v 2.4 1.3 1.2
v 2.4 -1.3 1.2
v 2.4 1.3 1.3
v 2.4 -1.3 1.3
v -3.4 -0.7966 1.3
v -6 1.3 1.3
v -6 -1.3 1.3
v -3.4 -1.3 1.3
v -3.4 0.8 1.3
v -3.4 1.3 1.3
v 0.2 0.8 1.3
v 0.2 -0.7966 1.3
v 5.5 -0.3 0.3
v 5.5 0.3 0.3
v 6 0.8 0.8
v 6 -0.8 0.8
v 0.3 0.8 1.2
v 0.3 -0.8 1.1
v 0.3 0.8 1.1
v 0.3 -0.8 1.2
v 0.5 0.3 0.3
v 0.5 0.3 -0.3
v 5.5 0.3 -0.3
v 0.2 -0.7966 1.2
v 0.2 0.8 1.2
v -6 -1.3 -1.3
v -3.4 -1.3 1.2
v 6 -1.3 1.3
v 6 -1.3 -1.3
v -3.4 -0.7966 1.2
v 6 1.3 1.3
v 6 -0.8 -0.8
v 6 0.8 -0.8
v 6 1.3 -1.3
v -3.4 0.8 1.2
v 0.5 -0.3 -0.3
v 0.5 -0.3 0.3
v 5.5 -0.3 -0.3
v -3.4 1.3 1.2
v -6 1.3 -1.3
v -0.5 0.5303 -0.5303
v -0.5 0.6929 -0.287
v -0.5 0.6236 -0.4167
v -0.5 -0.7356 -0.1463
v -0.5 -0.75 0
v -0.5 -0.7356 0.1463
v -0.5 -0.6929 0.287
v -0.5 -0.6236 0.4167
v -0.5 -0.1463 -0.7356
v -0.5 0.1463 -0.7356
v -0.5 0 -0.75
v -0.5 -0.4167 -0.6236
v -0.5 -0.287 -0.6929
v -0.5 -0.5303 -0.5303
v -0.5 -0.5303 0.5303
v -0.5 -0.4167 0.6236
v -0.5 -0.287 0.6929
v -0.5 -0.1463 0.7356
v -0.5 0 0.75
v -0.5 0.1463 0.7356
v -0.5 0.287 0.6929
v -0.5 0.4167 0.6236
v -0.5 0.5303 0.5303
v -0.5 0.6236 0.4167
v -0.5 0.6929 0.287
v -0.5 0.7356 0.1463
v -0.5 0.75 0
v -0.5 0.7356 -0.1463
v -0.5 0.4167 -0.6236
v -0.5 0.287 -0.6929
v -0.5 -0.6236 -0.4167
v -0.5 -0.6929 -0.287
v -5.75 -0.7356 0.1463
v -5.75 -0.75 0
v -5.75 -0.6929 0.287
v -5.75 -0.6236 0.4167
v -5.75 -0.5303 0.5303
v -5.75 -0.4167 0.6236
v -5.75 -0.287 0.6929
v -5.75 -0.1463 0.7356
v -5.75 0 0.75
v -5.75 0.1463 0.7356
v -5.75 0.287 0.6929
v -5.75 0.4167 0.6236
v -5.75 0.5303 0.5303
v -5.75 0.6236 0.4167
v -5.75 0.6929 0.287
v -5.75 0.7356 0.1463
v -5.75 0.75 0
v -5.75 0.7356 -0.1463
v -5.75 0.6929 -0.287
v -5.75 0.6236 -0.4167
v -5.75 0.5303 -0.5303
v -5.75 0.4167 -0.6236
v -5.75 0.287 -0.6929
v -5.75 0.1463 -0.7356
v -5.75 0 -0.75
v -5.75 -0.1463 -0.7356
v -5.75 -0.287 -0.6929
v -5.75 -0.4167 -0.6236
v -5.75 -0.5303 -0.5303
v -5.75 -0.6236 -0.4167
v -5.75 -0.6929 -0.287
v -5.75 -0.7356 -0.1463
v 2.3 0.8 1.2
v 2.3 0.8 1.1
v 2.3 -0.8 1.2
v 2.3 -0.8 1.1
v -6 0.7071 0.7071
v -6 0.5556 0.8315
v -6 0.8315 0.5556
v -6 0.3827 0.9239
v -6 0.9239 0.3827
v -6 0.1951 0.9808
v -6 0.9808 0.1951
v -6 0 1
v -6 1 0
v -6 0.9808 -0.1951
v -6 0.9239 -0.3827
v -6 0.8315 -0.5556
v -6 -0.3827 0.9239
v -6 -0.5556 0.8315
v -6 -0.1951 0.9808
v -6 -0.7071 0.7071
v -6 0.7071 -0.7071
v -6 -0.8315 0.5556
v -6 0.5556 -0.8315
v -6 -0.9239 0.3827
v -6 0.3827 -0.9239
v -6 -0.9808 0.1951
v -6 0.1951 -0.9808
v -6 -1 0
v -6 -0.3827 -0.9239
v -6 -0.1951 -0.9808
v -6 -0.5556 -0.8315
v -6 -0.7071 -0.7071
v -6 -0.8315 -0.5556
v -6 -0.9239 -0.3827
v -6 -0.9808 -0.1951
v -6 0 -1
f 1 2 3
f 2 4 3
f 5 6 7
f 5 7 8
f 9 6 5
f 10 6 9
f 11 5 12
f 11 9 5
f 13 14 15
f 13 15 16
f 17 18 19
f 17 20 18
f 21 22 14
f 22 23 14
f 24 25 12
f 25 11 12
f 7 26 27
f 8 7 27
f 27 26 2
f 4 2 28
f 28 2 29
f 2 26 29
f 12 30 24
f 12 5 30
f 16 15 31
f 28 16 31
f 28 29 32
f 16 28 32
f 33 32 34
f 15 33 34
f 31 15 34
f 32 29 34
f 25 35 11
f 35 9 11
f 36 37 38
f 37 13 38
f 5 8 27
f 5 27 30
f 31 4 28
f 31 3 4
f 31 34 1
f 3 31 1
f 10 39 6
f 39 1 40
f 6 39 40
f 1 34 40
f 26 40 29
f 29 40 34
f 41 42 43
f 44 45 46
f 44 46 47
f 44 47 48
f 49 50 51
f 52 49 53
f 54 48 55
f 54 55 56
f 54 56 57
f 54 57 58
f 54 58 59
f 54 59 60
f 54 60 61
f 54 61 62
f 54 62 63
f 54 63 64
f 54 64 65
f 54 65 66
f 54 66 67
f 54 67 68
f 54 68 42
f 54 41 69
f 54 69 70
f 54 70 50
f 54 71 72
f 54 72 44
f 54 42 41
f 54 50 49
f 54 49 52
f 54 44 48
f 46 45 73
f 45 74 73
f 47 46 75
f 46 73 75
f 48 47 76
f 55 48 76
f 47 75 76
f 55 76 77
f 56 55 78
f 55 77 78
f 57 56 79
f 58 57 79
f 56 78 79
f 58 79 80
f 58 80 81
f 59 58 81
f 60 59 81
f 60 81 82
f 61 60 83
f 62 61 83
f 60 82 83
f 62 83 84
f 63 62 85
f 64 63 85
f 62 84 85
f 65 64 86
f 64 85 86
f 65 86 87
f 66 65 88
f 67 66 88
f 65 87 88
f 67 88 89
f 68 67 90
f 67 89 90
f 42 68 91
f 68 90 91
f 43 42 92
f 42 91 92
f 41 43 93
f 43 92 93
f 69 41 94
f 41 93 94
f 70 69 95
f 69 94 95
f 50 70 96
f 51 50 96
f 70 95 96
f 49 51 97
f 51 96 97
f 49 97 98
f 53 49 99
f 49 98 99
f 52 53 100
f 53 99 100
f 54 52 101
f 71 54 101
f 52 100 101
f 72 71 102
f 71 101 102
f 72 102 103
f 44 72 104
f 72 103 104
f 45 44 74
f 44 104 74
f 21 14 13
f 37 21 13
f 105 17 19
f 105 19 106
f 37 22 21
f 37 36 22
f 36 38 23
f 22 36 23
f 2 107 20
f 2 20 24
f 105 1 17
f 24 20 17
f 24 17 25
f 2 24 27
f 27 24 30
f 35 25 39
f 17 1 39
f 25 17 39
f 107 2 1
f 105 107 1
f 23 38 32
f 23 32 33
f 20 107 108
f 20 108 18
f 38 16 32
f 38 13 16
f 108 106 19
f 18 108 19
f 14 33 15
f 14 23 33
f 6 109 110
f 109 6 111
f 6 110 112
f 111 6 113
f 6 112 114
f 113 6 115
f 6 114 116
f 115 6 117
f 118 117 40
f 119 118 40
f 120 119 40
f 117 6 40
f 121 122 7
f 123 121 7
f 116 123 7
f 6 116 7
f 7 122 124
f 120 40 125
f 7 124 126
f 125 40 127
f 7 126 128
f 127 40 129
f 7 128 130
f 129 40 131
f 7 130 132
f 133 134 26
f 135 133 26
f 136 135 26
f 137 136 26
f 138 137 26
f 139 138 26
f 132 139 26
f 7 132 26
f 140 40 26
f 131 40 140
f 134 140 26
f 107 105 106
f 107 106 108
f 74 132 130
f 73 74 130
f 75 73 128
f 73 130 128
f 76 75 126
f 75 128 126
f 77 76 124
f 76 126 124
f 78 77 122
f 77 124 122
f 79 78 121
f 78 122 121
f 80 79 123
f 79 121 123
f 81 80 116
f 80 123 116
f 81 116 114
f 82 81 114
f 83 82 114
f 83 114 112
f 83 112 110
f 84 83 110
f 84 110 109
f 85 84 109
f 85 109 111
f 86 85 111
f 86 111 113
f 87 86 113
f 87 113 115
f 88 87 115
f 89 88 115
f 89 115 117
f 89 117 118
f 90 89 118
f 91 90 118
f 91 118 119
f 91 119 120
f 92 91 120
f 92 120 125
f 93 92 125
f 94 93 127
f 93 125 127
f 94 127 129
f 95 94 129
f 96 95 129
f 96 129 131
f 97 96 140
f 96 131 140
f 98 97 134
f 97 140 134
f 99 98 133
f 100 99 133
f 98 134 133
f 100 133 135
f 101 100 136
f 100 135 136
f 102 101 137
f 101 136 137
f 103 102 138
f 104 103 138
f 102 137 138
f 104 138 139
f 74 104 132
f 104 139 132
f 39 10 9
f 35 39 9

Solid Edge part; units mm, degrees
sketch "Sketch1" plane through (0, 0, 0) normal (0, 0, 1) x (1, 0, 0)
  line L0 (-6, -1.3) -> (6, -1.3)
  line L1 (6, -1.3) -> (6, 1.3)
  line L2 (6, 1.3) -> (-6, 1.3)
  line L3 (-6, 1.3) -> (-6, -1.3)
  dimension "D1" = 2.6
  dimension "D2" = 12
extrude "Protrusion1" add sketch "Sketch1" along normal mid plane 2.6
sketch "Sketch2" plane through (6, 0, 0) normal (1, 0, 0) x (0, 1, 0)
  line L0 (-0.3, -0.3) -> (0.3, -0.3)
  line L1 (0.3, -0.3) -> (0.3, 0.3)
  line L2 (0.3, 0.3) -> (-0.3, 0.3)
  line L3 (-0.3, 0.3) -> (-0.3, -0.3)
  dimension "D1" = 0.6
  dimension "D2" = 0.6
extrude "Extrusionsausschnitt_1" cut sketch "Sketch2" against normal blind 5.5
chamfer "Fase_1" distance 0.5 angle 45 4 edges at (6, 0, 0.3) (6, 0.3, 0) (6, -0.3, 0) (6, 0, -0.3)
sketch "Sketch3" plane through (-6, 0, 0) normal (-1, 0, 0) x (0, -1, 0)
  circle A0 centre (0, 0) radius 0.75
  dimension "D1" = 1.5
extrude "Extrusionsausschnitt_2" cut sketch "Sketch3" against normal blind 5.5
sketch "Sketch4" plane through (0, 0, 1.3) normal (0, 0, 1) x (1, 0, 0)
  line L0 (0.2, -1.3) -> (-3.4, -1.3)
  line L1 (-3.4, -1.3) -> (-3.4, -0.7966)
  line L2 (-3.4, -0.7966) -> (0.2, -0.7966)
  line L3 (0.2, 0.8) -> (0.2, -0.7966)
  line L4 (-3.4, 0.8) -> (0.2, 0.8)
  line L5 (-3.4, 1.3) -> (-3.4, 0.8)
  line L6 (0.2, 1.3) -> (-3.4, 1.3)
  line L7 (2.4, 1.3) -> (0.2, 1.3)
  line L8 (2.4, -1.3) -> (2.4, 1.3)
  line L9 (0.2, -1.3) -> (2.4, -1.3)
  dimension "D1" = 3.6
  dimension "D2" = 2.2
  dimension "D3" = 0.5
  dimension "D4" = 0.5034
  dimension "D5" = 3.6
extrude "Extrusionsausschnitt_3" cut sketch "Sketch4" against normal blind 0.1
sketch "Sketch5" plane through (-0.5, 0, 1.2) normal (0, 0, 1) x (1, 0, 0)
  line L0 (0.8, 0.8) -> (2.8, 0.8)
  line L1 (2.8, 0.8) -> (2.8, -0.8)
  line L2 (2.8, -0.8) -> (0.8, -0.8)
  line L3 (0.8, -0.8) -> (0.8, 0.8)
  dimension "D1" = 0.1
  dimension "D2" = 0.1
  dimension "D3" = 1.6
  dimension "D4" = 0.5
extrude "Extrusionsausschnitt_4" cut sketch "Sketch5" against normal blind 0.1
chamfer "Fase_2" distance 0.25 angle 45 1 edges at (-6, 0.75, 0)
